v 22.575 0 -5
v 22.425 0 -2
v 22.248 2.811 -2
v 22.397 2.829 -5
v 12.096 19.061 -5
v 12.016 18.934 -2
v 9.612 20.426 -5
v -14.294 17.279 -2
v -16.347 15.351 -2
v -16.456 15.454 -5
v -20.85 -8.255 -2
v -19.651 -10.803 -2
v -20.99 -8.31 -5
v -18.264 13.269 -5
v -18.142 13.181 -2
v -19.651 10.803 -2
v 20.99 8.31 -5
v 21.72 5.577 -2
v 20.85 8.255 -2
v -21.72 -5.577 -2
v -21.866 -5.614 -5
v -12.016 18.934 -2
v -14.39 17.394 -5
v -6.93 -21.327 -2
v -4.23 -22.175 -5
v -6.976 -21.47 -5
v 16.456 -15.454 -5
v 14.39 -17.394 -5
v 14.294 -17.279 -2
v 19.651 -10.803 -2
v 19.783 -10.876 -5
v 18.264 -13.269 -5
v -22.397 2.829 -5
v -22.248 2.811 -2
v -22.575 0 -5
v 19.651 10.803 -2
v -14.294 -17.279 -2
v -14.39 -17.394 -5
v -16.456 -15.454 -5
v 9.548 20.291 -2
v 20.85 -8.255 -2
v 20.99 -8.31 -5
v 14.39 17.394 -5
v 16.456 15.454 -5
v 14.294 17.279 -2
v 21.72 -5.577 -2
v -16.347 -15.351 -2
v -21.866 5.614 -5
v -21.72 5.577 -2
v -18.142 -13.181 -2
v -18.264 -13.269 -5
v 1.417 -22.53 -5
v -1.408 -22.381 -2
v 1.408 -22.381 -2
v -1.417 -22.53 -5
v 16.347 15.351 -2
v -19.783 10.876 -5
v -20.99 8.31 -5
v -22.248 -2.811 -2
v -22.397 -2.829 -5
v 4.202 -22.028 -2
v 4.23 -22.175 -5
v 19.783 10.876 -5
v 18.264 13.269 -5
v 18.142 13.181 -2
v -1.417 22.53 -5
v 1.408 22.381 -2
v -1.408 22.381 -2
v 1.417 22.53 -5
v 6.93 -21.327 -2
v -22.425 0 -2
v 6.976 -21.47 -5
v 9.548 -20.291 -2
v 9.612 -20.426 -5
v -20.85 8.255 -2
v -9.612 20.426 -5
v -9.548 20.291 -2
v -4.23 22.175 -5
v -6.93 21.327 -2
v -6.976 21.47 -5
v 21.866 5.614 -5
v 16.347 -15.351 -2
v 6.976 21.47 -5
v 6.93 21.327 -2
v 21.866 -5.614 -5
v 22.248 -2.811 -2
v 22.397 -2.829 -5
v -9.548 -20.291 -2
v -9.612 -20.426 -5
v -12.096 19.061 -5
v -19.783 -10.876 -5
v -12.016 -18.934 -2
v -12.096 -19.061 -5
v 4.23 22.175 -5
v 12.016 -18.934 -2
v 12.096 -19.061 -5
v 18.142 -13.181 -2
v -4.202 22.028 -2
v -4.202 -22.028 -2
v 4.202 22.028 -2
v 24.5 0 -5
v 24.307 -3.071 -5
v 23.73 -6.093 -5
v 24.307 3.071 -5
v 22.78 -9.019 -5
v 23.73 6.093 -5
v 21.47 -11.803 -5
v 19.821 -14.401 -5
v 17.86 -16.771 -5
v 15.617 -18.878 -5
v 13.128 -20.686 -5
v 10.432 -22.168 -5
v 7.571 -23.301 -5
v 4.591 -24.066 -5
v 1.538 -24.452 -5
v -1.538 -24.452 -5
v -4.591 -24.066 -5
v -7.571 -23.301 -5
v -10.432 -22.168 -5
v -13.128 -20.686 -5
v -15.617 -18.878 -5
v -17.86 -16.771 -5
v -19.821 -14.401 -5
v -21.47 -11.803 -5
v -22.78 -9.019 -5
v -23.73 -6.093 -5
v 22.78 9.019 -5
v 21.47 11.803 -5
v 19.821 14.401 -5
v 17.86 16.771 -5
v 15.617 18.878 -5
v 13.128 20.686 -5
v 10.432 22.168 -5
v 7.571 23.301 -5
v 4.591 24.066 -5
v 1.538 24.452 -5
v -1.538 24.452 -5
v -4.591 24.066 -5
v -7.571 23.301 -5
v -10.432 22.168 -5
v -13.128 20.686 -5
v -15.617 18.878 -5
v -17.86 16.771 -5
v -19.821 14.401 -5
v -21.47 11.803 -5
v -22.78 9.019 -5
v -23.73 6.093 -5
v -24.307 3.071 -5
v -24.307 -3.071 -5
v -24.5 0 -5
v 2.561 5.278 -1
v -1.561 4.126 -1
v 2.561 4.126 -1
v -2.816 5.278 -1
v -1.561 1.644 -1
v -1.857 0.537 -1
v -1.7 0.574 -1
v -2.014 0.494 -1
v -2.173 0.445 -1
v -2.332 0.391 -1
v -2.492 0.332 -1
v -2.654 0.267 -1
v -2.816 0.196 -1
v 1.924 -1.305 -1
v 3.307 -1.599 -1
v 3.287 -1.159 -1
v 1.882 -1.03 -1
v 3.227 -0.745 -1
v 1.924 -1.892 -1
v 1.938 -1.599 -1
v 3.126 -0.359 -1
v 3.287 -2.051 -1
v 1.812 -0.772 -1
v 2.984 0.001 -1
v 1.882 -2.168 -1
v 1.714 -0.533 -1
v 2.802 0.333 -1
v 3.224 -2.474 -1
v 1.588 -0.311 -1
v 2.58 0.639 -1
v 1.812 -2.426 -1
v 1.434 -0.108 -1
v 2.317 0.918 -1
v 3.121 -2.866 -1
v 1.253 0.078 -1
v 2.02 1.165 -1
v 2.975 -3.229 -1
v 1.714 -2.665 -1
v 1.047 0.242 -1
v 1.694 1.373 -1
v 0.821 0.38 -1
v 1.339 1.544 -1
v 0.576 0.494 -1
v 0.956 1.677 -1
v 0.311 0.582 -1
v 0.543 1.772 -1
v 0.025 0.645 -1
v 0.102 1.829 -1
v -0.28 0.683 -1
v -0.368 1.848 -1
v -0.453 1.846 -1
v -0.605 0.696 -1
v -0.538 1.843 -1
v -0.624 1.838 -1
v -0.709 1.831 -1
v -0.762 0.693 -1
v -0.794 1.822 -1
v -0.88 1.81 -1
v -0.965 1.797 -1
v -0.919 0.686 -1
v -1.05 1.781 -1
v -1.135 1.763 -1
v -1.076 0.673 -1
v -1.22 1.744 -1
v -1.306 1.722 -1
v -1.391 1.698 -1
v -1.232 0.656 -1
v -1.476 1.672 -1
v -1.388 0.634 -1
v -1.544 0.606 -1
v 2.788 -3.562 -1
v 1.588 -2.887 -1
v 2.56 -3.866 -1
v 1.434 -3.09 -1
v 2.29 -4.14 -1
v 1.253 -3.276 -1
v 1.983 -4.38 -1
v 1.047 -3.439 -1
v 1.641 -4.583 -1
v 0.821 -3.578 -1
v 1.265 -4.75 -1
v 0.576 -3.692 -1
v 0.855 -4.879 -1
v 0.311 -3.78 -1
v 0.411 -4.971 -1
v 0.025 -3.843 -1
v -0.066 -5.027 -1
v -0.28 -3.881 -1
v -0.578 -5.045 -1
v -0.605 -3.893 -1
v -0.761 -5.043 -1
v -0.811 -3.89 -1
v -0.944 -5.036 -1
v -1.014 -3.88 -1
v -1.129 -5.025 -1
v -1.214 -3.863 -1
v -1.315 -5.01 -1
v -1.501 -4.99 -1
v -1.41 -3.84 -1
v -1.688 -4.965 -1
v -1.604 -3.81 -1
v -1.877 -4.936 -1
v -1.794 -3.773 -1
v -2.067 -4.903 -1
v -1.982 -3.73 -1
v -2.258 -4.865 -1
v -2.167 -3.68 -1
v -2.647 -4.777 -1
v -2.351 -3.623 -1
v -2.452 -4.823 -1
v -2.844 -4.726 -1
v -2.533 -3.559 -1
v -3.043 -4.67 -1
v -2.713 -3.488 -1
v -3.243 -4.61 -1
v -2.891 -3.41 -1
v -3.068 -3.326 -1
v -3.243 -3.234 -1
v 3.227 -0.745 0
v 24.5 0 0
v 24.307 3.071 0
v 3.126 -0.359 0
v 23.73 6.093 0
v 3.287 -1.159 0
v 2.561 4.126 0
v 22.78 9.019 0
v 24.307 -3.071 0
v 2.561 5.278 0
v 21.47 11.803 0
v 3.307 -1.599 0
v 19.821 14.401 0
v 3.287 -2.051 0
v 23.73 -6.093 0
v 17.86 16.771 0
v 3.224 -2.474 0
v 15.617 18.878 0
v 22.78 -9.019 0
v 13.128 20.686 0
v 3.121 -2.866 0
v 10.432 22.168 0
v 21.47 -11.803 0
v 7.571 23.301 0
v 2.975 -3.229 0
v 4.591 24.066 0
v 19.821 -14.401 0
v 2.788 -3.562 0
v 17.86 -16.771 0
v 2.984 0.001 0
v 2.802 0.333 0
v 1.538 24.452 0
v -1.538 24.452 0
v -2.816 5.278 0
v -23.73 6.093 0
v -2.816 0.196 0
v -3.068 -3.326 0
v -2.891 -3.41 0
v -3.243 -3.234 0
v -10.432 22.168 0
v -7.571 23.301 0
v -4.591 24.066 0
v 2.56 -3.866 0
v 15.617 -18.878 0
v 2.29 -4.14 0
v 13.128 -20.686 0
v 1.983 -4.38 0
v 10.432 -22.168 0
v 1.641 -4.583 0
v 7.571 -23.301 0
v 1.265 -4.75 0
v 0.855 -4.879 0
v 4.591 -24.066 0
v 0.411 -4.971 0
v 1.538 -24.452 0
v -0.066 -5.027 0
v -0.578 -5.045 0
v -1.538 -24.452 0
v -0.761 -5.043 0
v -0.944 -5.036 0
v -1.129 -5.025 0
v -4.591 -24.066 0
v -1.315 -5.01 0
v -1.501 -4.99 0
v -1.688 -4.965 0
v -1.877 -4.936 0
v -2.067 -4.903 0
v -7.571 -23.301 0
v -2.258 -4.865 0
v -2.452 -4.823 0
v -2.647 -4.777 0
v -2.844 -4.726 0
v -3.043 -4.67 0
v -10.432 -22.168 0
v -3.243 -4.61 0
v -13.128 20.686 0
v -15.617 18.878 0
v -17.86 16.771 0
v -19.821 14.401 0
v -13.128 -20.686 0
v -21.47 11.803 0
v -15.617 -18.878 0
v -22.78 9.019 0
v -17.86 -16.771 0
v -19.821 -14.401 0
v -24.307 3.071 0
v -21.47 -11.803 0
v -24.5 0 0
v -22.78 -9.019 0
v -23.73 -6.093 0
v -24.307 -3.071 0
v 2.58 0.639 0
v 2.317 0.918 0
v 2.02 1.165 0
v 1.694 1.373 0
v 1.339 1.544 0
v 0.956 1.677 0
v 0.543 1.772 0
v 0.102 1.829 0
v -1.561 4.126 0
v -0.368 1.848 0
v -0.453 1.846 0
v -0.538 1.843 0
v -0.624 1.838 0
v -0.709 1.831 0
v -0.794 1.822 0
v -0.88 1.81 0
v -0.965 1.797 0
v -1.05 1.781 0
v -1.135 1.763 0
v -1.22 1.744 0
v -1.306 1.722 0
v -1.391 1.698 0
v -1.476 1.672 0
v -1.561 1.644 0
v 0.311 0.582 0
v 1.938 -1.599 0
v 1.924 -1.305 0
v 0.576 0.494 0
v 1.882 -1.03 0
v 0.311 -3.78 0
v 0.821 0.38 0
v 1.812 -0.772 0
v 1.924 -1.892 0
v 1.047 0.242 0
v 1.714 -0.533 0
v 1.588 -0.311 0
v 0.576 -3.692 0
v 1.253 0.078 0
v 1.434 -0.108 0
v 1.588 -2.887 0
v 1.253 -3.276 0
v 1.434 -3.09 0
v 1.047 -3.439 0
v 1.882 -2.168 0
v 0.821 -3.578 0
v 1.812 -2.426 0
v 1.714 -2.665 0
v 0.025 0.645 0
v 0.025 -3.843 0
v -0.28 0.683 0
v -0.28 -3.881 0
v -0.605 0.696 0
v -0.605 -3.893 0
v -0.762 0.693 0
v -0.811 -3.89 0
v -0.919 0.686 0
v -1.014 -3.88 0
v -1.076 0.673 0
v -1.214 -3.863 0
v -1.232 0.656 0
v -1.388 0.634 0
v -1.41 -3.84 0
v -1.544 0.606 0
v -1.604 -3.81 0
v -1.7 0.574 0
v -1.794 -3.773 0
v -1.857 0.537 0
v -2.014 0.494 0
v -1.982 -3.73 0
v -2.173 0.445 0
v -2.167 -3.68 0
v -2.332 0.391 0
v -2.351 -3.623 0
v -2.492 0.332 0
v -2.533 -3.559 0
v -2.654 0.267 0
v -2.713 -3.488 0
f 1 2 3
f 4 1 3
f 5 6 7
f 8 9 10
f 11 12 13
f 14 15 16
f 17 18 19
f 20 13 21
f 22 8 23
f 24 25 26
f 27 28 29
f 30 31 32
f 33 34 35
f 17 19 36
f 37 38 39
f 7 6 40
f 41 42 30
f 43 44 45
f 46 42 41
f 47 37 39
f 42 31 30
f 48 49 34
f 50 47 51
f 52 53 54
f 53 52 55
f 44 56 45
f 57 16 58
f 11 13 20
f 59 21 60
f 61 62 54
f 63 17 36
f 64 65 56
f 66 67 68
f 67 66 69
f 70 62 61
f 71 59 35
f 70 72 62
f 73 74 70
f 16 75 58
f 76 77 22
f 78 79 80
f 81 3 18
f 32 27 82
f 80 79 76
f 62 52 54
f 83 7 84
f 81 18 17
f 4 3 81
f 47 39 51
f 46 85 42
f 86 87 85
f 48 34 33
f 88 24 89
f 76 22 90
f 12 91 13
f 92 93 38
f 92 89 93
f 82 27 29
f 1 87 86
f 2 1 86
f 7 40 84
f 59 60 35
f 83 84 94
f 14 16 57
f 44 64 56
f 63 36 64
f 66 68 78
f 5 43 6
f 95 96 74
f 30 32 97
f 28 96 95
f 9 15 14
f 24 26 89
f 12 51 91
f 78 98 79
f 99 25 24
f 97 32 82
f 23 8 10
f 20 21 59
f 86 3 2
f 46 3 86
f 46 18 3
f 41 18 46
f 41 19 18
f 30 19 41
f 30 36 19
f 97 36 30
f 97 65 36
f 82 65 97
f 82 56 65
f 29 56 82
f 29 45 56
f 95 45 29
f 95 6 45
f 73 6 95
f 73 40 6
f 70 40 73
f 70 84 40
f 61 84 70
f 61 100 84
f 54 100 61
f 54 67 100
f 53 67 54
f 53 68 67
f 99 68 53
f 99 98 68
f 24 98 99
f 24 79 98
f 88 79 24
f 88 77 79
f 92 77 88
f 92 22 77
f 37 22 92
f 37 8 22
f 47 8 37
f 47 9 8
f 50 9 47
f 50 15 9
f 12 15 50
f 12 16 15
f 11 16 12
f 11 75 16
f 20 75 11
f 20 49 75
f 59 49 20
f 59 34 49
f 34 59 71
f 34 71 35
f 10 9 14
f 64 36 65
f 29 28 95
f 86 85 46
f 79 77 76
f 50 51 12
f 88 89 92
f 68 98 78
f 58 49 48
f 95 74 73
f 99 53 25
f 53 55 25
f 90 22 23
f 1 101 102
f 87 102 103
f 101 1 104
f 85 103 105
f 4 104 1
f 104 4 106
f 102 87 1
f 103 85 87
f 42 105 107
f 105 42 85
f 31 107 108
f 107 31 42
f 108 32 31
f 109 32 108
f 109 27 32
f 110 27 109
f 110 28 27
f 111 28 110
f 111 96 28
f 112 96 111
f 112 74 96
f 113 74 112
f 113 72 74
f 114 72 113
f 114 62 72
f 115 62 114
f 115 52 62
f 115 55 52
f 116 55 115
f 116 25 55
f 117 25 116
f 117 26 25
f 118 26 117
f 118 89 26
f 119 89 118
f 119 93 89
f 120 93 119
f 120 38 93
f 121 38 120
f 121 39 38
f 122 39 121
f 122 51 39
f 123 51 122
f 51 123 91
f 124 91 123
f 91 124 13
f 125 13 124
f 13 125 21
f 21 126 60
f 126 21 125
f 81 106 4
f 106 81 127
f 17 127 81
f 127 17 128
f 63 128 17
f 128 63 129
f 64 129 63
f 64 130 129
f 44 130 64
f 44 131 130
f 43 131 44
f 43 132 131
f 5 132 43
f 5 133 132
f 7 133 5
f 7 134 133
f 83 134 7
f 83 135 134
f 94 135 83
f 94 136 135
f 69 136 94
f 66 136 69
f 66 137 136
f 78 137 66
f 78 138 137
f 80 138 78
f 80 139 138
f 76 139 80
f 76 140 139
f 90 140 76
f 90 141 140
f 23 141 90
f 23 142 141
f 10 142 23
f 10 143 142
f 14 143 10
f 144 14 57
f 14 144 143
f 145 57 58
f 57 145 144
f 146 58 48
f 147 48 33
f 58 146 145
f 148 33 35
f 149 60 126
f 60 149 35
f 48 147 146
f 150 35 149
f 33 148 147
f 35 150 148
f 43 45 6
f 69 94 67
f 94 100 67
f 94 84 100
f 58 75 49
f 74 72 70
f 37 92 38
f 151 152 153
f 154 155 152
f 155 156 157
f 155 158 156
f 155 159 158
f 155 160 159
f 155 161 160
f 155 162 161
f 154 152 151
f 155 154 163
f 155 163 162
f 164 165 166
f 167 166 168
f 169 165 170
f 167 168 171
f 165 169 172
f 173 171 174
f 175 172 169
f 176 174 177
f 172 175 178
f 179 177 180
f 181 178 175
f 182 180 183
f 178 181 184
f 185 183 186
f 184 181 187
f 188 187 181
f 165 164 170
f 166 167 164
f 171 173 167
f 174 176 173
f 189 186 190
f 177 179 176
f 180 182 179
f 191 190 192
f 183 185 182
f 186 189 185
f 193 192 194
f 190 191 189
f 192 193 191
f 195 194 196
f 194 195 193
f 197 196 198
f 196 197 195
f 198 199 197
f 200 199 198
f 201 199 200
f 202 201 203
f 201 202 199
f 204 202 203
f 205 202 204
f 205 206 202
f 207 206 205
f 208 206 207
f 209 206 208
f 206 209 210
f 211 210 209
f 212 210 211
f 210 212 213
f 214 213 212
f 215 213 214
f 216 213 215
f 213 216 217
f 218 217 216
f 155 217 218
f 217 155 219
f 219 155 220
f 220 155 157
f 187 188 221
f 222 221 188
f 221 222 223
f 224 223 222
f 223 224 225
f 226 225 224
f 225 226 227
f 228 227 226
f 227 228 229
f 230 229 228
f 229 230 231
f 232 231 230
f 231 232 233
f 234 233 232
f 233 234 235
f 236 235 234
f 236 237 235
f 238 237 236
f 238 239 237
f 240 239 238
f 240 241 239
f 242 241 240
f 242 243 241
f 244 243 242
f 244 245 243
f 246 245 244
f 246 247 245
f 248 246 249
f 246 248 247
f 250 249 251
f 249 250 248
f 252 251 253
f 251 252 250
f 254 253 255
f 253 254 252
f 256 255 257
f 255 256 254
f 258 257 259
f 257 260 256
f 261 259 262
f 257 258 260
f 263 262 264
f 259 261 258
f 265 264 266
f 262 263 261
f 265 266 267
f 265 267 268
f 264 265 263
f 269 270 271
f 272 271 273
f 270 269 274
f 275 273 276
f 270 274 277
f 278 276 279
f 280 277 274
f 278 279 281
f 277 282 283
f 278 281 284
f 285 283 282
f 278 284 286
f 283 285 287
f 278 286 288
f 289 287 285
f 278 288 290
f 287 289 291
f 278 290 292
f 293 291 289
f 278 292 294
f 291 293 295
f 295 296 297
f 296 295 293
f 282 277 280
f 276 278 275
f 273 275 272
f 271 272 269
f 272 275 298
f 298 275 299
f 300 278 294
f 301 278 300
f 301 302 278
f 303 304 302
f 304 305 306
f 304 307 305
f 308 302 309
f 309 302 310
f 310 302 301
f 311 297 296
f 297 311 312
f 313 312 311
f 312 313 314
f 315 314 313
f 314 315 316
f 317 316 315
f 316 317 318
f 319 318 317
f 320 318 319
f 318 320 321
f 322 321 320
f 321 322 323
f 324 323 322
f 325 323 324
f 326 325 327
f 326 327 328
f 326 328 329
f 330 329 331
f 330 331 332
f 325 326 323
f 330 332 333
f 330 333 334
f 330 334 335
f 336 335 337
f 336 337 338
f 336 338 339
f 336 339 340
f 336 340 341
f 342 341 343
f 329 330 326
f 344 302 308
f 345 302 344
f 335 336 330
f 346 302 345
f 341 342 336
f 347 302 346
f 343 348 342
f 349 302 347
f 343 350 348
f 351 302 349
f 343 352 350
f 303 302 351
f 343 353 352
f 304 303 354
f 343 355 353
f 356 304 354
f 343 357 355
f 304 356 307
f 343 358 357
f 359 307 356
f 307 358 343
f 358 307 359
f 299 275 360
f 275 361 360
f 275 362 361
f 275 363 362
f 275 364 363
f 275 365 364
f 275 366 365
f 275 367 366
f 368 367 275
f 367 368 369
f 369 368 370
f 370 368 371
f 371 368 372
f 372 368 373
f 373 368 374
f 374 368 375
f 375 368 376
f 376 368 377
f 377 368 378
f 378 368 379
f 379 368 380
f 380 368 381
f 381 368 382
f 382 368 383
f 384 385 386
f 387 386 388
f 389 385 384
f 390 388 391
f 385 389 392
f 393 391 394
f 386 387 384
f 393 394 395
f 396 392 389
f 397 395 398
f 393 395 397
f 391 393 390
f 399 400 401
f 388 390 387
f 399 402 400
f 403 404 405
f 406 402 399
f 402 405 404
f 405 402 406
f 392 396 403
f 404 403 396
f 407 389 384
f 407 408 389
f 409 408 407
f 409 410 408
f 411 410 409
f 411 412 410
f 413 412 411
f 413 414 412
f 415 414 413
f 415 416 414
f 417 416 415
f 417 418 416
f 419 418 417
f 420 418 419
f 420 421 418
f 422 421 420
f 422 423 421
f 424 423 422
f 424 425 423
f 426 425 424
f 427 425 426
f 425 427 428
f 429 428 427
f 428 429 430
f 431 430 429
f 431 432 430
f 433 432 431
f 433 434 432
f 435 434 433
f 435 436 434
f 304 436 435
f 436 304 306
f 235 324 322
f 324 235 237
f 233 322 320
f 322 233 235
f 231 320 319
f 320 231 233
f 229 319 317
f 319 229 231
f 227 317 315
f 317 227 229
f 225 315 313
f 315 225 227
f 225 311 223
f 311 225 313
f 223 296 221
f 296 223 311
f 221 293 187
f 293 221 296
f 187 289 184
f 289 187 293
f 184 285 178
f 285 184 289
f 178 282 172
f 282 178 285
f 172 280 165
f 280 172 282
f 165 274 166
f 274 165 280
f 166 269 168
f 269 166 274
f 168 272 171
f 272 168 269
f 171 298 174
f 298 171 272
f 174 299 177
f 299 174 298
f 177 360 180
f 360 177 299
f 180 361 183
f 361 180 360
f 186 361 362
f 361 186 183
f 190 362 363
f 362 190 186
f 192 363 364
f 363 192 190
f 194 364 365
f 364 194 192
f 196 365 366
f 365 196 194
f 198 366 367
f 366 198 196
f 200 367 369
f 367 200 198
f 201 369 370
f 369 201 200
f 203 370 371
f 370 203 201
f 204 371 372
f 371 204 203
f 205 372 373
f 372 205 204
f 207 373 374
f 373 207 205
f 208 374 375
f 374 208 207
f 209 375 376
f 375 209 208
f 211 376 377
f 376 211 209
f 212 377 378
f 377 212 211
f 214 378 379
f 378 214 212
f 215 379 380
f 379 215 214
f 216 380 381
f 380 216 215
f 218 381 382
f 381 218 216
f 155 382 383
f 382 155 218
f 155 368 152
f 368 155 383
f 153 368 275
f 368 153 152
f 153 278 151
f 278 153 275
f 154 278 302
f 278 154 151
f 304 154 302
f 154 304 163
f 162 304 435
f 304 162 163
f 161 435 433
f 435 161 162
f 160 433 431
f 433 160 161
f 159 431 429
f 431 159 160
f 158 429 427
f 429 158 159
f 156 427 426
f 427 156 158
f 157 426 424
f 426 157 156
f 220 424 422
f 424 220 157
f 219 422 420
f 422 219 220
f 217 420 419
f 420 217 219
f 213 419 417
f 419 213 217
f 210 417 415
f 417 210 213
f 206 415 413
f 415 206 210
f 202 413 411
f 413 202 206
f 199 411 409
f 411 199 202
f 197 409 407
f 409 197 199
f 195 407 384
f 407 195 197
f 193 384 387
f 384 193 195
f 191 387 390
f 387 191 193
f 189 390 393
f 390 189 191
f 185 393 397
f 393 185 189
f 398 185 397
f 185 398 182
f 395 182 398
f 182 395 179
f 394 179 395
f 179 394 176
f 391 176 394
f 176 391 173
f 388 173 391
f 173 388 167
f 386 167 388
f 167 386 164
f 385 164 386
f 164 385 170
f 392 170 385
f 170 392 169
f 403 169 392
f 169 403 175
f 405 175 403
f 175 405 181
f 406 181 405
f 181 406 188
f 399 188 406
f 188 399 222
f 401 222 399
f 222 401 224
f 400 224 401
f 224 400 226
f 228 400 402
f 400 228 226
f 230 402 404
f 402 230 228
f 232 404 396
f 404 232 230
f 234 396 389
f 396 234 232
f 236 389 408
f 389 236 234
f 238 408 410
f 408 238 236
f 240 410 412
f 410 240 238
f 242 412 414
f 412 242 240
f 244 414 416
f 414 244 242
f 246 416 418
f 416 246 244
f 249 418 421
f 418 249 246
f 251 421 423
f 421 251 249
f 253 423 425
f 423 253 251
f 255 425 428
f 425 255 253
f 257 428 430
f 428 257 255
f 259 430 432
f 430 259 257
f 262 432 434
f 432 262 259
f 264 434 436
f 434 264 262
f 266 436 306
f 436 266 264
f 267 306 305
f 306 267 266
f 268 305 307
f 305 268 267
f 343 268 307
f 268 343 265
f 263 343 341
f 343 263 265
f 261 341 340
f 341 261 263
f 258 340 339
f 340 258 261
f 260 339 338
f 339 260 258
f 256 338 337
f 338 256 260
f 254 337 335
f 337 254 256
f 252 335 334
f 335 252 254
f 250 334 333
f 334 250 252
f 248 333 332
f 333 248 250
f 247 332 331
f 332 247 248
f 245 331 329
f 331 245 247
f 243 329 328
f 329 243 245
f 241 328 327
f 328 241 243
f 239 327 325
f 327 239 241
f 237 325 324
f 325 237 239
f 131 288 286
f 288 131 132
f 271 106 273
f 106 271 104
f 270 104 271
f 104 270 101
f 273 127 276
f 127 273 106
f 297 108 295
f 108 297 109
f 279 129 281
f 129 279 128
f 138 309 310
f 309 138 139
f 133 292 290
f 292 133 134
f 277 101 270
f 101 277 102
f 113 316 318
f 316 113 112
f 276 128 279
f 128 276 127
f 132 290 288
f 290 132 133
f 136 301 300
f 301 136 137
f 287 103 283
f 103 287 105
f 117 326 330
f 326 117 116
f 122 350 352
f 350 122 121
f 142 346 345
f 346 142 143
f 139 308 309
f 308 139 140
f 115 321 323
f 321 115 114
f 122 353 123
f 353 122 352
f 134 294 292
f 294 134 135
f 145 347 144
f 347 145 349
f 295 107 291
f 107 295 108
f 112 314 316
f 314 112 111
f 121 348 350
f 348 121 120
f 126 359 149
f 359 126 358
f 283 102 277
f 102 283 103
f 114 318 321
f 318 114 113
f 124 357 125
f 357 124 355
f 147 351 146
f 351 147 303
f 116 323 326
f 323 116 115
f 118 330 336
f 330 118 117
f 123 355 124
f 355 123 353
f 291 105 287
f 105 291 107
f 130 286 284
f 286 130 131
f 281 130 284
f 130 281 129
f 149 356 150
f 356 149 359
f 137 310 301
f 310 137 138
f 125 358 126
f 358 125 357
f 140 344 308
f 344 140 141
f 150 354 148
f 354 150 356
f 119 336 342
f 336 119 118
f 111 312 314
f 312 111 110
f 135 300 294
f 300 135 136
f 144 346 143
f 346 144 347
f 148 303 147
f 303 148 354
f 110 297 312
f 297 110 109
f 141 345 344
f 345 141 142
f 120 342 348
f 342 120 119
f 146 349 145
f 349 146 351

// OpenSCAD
$fn = 50;

difference() {
	union() {
		translate(v = [0, 0, -5.0]) {
			cylinder(h = 5, r = 24.5);
		}
	}
	union() {
		#translate(v = [0, 0, -5.0]) {
			cylinder(h = 3, r1 = 22.575, r2 = 22.425);
		}
		translate(v = [0, 0, -1]) {
			linear_extrude(height = 1) {
				text(font = "Impact", halign = "center", size = 10, text = "5", valign = "center");
			}
		}
	}
}
